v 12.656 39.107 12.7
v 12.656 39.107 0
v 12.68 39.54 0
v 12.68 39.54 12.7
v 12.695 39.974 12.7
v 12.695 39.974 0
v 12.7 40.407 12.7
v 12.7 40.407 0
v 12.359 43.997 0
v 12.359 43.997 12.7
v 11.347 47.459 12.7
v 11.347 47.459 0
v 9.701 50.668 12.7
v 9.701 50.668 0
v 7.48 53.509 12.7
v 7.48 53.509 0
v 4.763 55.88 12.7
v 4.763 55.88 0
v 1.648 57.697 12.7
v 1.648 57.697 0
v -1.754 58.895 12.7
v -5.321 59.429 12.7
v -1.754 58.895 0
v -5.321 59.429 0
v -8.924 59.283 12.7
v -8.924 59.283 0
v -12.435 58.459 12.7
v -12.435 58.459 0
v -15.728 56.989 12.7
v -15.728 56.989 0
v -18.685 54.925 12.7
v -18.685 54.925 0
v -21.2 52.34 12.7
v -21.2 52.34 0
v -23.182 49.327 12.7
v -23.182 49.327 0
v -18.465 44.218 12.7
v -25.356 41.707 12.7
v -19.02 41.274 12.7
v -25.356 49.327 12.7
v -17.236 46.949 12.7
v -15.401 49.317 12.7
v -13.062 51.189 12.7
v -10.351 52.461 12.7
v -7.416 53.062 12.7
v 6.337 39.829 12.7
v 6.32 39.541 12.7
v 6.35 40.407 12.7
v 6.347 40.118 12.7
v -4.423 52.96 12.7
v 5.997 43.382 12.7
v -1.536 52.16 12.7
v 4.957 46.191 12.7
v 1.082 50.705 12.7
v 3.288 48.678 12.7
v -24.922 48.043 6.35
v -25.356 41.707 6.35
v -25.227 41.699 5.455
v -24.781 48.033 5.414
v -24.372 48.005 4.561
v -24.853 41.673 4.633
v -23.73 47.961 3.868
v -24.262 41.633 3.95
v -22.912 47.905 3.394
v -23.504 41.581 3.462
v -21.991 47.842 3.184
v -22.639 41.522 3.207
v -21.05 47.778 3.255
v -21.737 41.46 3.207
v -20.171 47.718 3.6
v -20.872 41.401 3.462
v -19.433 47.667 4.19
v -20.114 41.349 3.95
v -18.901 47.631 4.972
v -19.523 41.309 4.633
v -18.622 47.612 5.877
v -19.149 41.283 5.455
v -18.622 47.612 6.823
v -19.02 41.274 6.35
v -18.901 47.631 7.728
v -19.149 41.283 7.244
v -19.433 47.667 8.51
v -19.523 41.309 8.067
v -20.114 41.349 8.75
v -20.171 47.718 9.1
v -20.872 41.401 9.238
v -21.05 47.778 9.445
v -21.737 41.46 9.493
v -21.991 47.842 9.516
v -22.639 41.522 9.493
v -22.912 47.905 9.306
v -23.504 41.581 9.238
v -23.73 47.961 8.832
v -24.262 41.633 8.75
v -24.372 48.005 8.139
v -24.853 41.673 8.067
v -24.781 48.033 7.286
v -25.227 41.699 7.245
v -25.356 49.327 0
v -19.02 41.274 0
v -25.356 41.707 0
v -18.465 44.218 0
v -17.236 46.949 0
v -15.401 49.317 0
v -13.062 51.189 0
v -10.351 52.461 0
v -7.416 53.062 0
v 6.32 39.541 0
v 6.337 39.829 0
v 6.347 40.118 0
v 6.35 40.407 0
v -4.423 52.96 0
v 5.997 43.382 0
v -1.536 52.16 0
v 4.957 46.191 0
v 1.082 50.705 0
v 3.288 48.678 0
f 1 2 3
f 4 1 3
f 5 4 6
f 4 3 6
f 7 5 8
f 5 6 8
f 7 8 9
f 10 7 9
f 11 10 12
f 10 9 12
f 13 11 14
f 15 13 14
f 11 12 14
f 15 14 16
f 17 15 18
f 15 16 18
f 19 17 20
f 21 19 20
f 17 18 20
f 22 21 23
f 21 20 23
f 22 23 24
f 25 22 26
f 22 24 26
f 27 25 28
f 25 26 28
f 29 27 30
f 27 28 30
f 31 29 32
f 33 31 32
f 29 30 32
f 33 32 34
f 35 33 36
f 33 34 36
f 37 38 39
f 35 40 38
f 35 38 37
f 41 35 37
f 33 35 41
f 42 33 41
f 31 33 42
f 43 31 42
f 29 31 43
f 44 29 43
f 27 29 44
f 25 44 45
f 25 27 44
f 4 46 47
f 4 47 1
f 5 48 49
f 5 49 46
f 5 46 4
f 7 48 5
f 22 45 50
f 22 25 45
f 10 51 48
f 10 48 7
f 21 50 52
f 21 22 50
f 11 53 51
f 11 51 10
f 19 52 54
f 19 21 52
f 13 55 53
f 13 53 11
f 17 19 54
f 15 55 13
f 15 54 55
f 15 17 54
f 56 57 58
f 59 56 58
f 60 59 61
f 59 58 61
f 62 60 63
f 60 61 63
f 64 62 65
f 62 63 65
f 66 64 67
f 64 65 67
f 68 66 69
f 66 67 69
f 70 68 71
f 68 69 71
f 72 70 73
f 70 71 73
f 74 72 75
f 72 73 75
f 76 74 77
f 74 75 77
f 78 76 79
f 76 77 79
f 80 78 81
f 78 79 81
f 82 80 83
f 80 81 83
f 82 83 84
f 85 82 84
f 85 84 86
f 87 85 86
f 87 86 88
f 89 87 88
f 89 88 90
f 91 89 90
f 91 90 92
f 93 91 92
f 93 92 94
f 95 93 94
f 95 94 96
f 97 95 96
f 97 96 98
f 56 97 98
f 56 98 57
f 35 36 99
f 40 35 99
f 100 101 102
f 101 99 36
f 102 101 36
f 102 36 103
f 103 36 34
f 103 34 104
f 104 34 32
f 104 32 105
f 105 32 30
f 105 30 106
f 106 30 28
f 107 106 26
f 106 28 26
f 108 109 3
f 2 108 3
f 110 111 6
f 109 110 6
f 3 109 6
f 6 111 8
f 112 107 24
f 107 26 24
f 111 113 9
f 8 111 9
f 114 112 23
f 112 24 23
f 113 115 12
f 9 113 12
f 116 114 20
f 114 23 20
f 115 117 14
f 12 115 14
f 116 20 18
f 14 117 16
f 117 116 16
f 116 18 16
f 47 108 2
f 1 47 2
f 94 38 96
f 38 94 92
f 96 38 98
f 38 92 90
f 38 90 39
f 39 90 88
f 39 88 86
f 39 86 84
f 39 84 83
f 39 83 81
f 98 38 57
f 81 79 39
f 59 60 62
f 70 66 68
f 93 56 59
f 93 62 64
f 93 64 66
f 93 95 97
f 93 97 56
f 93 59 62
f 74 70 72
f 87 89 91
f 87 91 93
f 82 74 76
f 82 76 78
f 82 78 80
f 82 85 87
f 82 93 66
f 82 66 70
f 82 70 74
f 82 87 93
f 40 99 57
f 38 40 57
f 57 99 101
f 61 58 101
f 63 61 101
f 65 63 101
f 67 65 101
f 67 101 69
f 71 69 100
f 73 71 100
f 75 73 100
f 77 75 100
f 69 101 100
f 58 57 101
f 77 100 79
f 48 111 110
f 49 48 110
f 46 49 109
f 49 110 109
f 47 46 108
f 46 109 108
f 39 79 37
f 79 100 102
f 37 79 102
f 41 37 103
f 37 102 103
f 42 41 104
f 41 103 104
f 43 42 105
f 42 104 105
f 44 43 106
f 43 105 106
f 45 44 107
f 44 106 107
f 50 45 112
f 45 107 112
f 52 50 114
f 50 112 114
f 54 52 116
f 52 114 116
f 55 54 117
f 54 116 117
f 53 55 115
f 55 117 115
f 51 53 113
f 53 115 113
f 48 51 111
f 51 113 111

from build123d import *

# Parameters (mm, degrees)
F1_DEPTH = 12.7
F3_DEPTH = 6.35


with BuildPart() as f1:
    # F0 (on Top) → F1 (new body)
    with BuildSketch(Plane.XY):
        with BuildLine():
            Line((-19.0055783398, 41.7074999772), (-25.3555783398, 41.7074999772))
            Line((-25.3555783398, 41.7074999772), (-19.0203855599, 41.2741035754))
            ThreePointArc((-19.0203855599, 41.2741035754), (-5.9163507237, 53.0999050026), (6.35, 40.4073107719))
            ThreePointArc((6.35, 40.4073107719), (6.3425942307, 39.9736614957), (6.3203855599, 39.5405179684))
            Line((6.3203855599, 39.5405179684), (12.6555783398, 39.1071215667))
            ThreePointArc((12.6555783398, 39.1071215667), (12.688891346, 39.7568368575), (12.7, 40.4073107719))
            ThreePointArc((12.7, 40.4073107719), (-1.7541560784, 58.8946231415), (-23.1824901468, 49.3274999772))
            Line((-23.1824901468, 49.3274999772), (-19.0055783398, 49.3274999772))
            Line((-19.0055783398, 49.3274999772), (-19.0055783398, 41.7074999772))
        make_face()
        with BuildLine():
            ThreePointArc((-23.1824901468, 49.3274999772), (-24.6696039317, 45.6317353132), (-25.3555783398, 41.7074999772))
            Line((-25.3555783398, 41.7074999772), (-19.0055783398, 41.7074999772))
            Line((-19.0055783398, 41.7074999772), (-19.0055783398, 49.3274999772))
            Line((-19.0055783398, 49.3274999772), (-23.1824901468, 49.3274999772))
        make_face()
        with BuildLine():
            Line((-25.3555783398, 49.3274999772), (-25.3555783398, 41.7074999772))
            ThreePointArc((-25.3555783398, 41.7074999772), (-24.6696039317, 45.6317353132), (-23.1824901468, 49.3274999772))
            Line((-23.1824901468, 49.3274999772), (-25.3555783398, 49.3274999772))
        make_face()
    extrude(amount=F1_DEPTH)

    # F2 (on face) → F3 (cut)
    with BuildSketch(Plane(origin=(2.7218447995, 39.7866974726, 0), x_dir=(0.9976681543, -0.0682514019, 0), z_dir=(-0.0682514019, -0.9976681543, 0))):
        with BuildLine():
            ThreePointArc((-21.7930483851, 6.35), (-24.9680483851, 9.525), (-28.1430483851, 6.35))
            ThreePointArc((-28.1430483851, 6.35), (-24.9680483851, 3.175), (-21.7930483851, 6.35))
        make_face()
    extrude(amount=-F3_DEPTH, mode=Mode.SUBTRACT)


solid = f1.part
